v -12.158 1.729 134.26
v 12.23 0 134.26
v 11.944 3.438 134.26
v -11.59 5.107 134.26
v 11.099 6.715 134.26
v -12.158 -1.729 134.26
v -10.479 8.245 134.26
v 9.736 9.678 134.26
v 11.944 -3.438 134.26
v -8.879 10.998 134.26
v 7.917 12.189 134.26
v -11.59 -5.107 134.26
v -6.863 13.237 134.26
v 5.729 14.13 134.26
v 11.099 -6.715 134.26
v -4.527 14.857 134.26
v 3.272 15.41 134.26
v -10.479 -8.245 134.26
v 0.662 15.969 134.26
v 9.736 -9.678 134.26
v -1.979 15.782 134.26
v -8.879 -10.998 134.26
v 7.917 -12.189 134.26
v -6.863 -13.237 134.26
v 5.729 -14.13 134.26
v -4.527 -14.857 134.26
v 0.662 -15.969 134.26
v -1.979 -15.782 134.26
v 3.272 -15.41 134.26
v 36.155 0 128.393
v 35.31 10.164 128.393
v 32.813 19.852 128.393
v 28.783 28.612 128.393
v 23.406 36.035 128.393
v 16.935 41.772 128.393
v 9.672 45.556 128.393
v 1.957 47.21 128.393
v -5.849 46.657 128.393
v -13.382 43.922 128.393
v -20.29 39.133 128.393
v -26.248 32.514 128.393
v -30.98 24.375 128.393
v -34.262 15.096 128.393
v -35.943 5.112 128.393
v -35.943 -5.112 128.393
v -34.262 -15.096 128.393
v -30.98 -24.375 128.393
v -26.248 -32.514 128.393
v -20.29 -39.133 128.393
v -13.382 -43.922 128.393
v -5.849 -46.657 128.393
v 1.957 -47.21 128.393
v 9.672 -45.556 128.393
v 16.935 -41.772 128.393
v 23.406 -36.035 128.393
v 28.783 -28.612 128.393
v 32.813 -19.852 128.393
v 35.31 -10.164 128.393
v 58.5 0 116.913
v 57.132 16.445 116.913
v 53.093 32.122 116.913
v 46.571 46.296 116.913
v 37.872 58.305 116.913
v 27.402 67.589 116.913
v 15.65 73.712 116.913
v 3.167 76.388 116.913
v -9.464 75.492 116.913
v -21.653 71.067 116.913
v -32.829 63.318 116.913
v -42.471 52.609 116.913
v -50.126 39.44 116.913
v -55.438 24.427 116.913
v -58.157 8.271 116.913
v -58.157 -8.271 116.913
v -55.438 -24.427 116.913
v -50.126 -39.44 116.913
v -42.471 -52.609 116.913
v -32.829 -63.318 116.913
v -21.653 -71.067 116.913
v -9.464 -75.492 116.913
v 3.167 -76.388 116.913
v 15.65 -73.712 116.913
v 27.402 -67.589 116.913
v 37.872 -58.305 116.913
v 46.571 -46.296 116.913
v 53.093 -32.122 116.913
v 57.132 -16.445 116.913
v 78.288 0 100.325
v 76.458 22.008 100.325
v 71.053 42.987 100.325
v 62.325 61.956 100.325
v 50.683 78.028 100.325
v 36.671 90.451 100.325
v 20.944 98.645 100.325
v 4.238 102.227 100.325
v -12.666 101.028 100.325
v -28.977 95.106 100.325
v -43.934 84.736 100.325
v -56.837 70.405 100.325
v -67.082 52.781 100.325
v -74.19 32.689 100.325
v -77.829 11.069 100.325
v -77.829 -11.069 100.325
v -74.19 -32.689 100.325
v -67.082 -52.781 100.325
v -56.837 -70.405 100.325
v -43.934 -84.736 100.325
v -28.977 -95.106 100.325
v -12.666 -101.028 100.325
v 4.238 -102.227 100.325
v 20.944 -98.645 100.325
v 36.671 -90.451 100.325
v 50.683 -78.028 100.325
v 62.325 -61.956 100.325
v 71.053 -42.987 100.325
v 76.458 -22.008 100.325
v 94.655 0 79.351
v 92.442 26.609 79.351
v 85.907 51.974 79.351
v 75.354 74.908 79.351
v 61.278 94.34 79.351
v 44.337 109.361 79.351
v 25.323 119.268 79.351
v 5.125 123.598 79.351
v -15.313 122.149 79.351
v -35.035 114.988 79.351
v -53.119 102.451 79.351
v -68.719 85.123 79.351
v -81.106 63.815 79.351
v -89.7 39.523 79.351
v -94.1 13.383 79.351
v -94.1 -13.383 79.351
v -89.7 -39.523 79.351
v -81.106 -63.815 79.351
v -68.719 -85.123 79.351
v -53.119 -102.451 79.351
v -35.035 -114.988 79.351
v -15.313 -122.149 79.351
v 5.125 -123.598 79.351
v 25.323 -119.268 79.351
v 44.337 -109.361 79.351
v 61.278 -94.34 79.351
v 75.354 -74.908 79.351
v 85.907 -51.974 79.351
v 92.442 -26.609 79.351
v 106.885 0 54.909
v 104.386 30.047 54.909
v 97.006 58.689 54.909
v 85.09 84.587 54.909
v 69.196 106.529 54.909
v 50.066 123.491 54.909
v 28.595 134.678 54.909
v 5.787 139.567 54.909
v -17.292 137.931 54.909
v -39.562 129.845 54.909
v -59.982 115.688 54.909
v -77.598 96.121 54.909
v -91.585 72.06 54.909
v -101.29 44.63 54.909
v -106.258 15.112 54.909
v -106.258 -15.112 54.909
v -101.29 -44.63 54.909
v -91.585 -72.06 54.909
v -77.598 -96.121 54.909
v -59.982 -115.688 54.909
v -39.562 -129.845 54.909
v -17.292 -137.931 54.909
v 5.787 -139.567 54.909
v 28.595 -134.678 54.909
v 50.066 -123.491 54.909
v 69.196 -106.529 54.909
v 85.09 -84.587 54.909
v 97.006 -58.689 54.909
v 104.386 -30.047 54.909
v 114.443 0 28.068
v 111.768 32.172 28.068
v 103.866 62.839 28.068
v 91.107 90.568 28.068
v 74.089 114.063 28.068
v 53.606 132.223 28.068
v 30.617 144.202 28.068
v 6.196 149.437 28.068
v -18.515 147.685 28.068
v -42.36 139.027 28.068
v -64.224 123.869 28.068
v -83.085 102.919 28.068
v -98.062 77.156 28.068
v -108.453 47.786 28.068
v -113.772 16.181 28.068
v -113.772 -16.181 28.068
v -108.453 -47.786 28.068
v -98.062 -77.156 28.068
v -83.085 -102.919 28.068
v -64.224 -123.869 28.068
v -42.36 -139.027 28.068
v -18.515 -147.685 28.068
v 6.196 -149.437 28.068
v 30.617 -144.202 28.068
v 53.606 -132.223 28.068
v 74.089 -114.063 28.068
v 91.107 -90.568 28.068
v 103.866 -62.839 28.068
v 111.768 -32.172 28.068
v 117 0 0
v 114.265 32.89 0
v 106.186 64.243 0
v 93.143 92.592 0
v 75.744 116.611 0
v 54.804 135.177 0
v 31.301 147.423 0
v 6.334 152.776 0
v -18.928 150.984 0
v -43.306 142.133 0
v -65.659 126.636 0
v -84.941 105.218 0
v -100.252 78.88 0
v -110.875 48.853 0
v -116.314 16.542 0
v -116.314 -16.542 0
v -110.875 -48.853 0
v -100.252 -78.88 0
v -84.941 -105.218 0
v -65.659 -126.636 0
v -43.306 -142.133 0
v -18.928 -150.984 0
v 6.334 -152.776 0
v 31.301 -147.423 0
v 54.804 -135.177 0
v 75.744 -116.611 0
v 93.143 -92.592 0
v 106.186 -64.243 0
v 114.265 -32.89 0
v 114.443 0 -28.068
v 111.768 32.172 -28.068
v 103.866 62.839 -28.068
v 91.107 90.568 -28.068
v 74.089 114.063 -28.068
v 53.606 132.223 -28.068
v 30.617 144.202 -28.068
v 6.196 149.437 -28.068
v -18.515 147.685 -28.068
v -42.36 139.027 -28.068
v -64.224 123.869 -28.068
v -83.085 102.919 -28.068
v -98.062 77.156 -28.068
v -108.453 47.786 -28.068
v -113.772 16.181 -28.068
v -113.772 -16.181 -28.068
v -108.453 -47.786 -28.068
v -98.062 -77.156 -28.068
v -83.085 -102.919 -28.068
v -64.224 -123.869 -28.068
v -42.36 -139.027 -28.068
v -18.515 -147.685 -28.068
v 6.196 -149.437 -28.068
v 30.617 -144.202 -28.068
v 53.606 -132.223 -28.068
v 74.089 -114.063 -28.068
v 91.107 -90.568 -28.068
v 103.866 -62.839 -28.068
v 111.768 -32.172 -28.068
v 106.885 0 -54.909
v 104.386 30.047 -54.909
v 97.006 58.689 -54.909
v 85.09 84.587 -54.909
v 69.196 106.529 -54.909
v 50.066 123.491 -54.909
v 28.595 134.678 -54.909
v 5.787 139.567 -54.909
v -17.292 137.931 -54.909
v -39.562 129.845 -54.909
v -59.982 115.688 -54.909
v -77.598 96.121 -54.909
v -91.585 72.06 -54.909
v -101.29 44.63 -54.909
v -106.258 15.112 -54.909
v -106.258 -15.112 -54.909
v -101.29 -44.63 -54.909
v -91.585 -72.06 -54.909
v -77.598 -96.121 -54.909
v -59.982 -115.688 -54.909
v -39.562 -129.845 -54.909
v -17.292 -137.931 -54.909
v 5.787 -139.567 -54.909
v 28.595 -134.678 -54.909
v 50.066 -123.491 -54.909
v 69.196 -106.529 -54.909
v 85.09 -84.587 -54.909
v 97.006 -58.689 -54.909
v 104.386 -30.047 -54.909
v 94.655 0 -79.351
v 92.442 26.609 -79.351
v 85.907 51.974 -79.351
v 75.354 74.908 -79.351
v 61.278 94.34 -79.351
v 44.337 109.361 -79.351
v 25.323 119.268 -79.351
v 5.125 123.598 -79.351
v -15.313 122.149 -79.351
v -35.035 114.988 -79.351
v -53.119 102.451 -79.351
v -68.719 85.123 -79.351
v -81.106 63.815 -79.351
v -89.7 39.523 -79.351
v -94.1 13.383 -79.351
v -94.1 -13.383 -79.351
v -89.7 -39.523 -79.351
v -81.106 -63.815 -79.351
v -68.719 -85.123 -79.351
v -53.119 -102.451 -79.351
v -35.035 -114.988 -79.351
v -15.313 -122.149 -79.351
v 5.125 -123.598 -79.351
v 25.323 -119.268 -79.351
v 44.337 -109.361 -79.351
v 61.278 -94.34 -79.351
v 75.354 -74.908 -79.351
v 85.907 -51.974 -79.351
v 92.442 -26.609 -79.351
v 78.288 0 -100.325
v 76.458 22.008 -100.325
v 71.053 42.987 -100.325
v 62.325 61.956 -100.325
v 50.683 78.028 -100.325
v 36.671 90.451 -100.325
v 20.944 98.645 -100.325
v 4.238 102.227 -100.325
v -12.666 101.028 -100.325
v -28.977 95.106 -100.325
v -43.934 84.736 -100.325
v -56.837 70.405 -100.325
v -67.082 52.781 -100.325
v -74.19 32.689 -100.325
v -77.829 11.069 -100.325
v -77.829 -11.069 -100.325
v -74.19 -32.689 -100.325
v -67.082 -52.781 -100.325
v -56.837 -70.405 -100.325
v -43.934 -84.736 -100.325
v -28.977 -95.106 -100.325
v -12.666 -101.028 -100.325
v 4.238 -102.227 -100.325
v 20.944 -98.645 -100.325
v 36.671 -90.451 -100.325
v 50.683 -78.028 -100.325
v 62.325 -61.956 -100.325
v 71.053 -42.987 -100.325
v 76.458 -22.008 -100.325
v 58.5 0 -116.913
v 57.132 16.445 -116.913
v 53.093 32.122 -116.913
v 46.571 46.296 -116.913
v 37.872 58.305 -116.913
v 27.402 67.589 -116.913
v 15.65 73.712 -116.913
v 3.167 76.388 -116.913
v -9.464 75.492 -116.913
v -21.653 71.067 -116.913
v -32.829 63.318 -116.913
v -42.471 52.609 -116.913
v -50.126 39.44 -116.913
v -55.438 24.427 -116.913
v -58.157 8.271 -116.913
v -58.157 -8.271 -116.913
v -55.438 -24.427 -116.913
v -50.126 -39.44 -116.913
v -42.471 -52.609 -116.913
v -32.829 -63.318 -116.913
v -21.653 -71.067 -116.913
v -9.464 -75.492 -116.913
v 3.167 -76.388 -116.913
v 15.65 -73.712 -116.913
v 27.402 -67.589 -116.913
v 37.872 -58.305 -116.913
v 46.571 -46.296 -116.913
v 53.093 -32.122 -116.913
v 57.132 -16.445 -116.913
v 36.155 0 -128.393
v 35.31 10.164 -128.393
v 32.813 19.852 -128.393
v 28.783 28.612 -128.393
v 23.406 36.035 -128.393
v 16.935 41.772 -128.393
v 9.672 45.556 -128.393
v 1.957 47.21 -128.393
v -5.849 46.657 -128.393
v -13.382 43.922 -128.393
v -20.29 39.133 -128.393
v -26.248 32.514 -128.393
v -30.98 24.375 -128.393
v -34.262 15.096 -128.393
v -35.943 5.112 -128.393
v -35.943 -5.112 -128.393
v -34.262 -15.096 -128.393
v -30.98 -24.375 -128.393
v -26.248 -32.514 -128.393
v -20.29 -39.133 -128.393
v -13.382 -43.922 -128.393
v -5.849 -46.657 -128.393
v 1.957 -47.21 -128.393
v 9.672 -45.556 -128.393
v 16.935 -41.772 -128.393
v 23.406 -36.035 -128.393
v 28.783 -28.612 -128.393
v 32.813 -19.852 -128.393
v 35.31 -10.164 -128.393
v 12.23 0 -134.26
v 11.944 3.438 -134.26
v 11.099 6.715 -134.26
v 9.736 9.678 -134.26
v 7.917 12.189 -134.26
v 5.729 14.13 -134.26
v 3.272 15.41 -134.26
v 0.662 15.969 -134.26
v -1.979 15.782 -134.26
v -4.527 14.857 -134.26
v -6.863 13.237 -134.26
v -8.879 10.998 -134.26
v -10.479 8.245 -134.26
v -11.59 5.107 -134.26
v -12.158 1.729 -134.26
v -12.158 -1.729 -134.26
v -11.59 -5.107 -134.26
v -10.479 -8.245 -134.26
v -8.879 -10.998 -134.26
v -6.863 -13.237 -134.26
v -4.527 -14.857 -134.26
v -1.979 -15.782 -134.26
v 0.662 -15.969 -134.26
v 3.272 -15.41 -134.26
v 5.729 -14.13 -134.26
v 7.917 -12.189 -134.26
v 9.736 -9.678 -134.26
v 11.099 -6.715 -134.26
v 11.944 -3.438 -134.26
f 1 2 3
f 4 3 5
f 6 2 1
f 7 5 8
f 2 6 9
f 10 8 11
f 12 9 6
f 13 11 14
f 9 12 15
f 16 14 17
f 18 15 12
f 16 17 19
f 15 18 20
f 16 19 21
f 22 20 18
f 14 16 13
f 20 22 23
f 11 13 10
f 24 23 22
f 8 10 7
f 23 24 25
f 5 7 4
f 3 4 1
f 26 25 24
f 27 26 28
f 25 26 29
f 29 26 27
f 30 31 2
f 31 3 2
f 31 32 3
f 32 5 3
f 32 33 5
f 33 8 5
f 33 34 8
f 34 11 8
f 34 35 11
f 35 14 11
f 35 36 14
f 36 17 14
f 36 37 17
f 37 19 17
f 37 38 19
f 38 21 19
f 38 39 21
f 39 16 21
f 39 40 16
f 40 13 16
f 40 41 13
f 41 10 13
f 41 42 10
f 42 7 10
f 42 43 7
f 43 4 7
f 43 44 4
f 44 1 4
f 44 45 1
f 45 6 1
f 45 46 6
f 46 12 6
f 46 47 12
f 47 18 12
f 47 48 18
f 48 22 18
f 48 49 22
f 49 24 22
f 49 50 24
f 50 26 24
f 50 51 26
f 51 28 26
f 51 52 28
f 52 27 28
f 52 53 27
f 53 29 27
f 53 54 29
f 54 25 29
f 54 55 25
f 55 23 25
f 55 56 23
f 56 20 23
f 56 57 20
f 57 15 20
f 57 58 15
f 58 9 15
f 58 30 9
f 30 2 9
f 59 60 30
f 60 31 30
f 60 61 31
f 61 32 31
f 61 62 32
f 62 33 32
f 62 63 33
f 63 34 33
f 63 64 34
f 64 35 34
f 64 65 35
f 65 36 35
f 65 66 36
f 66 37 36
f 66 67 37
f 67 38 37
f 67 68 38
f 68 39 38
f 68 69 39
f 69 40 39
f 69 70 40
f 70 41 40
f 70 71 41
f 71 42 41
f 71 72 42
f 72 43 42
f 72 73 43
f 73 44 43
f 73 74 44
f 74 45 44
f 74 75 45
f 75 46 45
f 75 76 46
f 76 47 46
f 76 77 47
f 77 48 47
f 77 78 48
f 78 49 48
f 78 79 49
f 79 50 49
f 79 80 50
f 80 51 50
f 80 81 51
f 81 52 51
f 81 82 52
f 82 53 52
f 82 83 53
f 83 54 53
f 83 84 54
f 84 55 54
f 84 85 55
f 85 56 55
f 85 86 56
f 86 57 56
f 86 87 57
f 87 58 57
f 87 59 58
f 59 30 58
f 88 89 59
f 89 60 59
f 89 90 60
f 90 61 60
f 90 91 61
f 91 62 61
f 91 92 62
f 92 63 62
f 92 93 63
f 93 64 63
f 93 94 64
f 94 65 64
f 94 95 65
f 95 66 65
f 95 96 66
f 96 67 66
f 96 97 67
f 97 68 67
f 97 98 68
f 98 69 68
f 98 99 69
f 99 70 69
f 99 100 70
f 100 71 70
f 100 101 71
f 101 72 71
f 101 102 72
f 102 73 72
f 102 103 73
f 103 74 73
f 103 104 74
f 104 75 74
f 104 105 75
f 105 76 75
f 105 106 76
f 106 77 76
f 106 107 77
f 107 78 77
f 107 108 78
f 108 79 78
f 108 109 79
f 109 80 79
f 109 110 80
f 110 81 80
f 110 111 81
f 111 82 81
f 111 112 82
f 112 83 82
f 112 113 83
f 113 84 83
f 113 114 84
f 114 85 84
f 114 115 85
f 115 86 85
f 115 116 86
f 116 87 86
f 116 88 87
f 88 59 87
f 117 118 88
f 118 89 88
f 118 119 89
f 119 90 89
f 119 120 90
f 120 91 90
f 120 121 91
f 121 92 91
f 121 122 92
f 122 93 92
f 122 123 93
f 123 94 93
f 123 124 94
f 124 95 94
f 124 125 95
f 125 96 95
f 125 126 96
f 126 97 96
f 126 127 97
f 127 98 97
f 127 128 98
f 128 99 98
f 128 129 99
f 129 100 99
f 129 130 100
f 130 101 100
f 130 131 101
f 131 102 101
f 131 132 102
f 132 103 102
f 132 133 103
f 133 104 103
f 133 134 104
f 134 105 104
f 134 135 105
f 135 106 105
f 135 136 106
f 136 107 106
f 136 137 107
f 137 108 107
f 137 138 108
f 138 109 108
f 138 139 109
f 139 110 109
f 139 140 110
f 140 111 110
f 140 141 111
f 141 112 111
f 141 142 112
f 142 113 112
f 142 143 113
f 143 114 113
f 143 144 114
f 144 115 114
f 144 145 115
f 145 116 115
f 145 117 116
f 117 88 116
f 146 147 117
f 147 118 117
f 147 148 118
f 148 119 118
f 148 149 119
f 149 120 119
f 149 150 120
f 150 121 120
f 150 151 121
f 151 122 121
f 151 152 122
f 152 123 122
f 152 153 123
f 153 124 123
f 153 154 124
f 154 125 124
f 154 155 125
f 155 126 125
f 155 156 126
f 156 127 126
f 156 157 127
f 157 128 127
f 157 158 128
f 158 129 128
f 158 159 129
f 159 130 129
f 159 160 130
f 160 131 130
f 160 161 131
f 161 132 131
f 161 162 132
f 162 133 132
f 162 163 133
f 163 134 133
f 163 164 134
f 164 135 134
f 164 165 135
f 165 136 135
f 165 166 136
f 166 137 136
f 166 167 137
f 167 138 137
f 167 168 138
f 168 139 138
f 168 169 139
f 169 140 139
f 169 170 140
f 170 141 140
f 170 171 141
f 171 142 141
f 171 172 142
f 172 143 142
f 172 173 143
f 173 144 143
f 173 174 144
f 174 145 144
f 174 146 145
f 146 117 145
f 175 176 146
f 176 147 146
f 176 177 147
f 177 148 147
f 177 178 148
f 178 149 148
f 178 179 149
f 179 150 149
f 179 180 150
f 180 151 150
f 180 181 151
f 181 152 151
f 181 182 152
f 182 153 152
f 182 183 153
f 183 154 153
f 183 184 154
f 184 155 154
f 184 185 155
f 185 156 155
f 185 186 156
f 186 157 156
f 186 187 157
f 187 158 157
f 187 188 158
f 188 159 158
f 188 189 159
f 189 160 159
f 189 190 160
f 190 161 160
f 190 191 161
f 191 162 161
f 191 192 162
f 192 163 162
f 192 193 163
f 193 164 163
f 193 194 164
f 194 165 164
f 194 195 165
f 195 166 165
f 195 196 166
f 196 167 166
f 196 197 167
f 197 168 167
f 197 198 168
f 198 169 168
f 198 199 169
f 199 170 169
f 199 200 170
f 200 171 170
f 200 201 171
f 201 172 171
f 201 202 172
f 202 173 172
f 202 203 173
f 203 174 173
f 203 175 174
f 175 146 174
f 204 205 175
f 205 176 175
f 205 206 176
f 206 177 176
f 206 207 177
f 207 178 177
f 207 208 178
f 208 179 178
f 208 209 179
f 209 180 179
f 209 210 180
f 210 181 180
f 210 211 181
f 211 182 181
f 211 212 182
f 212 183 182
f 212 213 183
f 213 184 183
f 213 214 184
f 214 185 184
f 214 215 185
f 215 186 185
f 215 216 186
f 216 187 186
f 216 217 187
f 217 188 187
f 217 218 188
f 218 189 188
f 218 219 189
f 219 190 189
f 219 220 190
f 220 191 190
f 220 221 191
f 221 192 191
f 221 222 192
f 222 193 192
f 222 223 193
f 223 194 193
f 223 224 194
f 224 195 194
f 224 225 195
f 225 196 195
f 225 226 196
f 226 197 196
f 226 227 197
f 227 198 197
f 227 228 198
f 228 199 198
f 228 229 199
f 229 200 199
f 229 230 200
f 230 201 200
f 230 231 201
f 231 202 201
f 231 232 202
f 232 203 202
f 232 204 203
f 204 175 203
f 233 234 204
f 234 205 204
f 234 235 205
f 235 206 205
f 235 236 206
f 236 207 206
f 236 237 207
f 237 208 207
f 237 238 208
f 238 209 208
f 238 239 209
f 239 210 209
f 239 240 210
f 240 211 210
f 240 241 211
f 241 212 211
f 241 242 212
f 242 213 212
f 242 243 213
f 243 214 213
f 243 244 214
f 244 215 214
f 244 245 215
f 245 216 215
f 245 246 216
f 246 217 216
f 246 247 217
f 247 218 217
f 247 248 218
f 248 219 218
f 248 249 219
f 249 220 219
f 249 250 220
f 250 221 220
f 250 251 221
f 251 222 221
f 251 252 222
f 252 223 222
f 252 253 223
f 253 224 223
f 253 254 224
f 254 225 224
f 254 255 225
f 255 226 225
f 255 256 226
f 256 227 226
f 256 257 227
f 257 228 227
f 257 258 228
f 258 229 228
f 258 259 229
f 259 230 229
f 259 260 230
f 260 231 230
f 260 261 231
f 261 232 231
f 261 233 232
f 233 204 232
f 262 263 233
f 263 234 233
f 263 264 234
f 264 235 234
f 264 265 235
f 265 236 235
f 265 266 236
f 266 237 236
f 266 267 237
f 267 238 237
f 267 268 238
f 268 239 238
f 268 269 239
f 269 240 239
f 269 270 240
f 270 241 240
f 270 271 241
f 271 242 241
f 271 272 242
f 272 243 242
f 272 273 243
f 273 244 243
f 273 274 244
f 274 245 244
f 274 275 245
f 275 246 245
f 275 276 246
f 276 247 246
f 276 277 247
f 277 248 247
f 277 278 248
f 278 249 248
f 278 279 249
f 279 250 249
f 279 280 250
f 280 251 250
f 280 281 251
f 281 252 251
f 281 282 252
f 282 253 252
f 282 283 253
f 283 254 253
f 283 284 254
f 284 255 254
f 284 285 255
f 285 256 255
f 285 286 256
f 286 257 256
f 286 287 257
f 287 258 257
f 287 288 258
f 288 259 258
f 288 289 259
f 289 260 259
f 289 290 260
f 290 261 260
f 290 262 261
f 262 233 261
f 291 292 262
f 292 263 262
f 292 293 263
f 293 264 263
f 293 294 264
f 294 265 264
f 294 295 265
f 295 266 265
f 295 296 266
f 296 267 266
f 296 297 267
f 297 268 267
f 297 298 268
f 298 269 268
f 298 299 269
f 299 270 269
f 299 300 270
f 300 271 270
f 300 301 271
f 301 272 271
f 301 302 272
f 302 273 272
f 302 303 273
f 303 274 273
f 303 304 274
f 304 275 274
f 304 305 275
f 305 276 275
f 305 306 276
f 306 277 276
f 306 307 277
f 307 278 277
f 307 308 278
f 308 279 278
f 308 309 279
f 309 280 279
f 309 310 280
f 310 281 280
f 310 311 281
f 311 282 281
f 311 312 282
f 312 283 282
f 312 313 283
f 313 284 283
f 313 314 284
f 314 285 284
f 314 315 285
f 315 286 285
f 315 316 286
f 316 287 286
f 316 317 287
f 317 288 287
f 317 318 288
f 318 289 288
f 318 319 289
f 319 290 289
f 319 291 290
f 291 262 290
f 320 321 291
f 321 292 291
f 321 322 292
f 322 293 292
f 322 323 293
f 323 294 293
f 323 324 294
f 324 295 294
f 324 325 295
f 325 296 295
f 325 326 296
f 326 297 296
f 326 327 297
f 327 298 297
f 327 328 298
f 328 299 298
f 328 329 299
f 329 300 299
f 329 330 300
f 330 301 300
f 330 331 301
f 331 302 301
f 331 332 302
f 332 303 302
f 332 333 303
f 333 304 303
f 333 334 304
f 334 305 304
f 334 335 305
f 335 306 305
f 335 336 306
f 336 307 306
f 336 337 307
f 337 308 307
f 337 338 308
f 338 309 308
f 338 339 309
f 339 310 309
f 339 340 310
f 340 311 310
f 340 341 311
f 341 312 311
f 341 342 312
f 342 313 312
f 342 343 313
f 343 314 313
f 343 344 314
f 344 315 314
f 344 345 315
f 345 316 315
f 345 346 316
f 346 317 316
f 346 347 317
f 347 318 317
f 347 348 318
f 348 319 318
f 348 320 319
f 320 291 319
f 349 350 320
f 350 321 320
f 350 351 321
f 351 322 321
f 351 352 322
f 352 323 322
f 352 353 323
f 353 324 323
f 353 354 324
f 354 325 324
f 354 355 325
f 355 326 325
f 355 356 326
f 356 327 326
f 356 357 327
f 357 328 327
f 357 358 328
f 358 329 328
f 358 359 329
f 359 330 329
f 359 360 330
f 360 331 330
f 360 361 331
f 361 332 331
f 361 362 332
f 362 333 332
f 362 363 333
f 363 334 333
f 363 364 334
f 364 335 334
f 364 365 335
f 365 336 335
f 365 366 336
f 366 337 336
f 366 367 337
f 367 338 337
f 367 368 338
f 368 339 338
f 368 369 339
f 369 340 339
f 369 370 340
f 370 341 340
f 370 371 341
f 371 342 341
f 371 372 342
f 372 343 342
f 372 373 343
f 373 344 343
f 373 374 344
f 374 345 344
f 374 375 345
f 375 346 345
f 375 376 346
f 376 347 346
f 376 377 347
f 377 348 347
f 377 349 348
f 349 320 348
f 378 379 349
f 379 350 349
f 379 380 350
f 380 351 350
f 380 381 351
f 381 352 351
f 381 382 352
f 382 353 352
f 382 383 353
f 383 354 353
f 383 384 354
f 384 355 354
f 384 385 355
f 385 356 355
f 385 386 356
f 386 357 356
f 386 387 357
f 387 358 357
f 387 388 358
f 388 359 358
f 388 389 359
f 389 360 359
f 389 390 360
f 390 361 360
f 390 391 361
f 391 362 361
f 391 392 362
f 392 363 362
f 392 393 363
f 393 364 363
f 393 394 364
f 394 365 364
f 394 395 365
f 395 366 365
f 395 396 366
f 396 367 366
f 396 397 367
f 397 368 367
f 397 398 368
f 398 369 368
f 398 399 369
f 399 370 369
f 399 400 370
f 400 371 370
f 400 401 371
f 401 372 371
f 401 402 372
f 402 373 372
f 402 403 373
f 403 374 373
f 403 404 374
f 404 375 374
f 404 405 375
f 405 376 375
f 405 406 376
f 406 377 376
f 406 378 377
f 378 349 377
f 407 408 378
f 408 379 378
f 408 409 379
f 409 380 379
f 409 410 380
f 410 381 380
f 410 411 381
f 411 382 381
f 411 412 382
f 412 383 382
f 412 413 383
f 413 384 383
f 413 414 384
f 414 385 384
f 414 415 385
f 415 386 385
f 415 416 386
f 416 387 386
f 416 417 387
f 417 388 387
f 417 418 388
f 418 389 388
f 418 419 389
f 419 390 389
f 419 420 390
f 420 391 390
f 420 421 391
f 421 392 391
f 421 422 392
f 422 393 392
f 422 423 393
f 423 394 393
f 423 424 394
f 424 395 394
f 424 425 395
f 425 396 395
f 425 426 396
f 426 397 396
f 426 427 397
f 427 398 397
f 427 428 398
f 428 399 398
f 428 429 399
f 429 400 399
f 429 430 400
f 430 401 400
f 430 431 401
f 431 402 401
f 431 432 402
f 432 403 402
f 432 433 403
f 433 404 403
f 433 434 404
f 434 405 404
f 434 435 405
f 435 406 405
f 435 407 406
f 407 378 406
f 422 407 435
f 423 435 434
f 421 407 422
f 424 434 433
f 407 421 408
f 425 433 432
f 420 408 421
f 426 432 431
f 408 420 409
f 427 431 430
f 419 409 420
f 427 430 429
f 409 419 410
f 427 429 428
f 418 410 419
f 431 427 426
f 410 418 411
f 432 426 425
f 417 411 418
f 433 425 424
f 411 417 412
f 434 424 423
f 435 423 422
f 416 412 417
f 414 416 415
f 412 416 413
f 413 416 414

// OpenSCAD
// Generated by SolidPython 1.0.1 on 2020-07-29 00:46:51


scale(v = [13, 17, 15]) {
	sphere(r = 9);
}
/***********************************************
*********      SolidPython code:      **********
************************************************
 
# import packages: SolidPython
from solid import *
from solid.utils import *
from itertools import chain, combinations, permutations


class Resize:

    def __init__(self, scad_file):
        self.scad_file = scad_file
        #self.scad_file = import_scad(scad_file)
        # cone/cylinder param:
        self.r1 = 0
        self.r2 = 0
        self.h = 0
        # rectangular prism param:
        self.w = 0
        self.l = 0
        # ellipse param:
        self.r = 0

    # import OpenScad code (file name corresponds to shape)


    # classify shape + parameters
    def assign(self, param1, param2, param3):
        if self.scad_file == 'cone.scad':
            self.r1 = param1
            self.r2 = param2
            self.h = param3
        elif self.scad_file == 'cylinder.scad':
            self.r1 = param1
            self.r2 = param2
            self.h = param3
        elif self.scad_file == 'rectangularPrism.scad':
            self.h = param1
            self.l = param2
            self.w = param3
        else:
            self.r = param1
            self.h = param2

    # resize parameters
    def iterate(self):
        x = range(3, 20, 2)
        i = 1
        if self.scad_file == 'cone.scad':
            tempList = list(permutations(x, 2))
            for temp in tempList:
                param1 = temp[0]
                param2 = temp[1]
                filepath = 'produced_scad_files/' + 'cone' + str(param1) + '_' + str(param2) + '_' + '.scad'
                scad_render_to_file(cylinder(h=param1, r1=param2, r2=0), filepath)

        elif self.scad_file == 'cylinder.scad':
            tempList = list(permutations(x, 3))
            for temp in tempList:
                param1 = temp[0]
                param2 = temp[1]
                filepath = 'produced_scad_files/' + 'cylinder' + str(param1) + '_' + str(param2) + '_' + '.scad'
                scad_render_to_file(cylinder(h=param1, r1=param2, r2=param2), filepath)

        elif self.scad_file == 'rectangularPrism.scad':
            tempList = list(permutations(x, 3))
            for temp in tempList:
                param1 = temp[0]
                param2 = temp[1]
                param3 = temp[2]
                filepath = 'produced_scad_files/' + 'rectangularPrism' + str(param1) + '_' + str(param2) + '_' + str(
                    param3) + '.scad'
                scad_render_to_file(cube(size=(param1, param2, param3)), filepath)

        elif self.scad_file == 'ellipse.scad':
            tempList = list(permutations(x, 4))
            for temp in tempList:
                param1 = temp[0]
                param2 = temp[1]
                param3 = temp[2]
                param4 = temp[3]
                filepath = 'produced_scad_files/' + 'ellipse' + str(param1) + '_' + str(param2) + '_' + str(param3) + '_' + str(param4) + '.scad'
                scad_render_to_file(scale([param1, param2, param3])(sphere(r=param4)), filepath)

    def render_to_scadfile(self):
        scad_render_to_file(scad, 'example.scad') 
 
************************************************/
